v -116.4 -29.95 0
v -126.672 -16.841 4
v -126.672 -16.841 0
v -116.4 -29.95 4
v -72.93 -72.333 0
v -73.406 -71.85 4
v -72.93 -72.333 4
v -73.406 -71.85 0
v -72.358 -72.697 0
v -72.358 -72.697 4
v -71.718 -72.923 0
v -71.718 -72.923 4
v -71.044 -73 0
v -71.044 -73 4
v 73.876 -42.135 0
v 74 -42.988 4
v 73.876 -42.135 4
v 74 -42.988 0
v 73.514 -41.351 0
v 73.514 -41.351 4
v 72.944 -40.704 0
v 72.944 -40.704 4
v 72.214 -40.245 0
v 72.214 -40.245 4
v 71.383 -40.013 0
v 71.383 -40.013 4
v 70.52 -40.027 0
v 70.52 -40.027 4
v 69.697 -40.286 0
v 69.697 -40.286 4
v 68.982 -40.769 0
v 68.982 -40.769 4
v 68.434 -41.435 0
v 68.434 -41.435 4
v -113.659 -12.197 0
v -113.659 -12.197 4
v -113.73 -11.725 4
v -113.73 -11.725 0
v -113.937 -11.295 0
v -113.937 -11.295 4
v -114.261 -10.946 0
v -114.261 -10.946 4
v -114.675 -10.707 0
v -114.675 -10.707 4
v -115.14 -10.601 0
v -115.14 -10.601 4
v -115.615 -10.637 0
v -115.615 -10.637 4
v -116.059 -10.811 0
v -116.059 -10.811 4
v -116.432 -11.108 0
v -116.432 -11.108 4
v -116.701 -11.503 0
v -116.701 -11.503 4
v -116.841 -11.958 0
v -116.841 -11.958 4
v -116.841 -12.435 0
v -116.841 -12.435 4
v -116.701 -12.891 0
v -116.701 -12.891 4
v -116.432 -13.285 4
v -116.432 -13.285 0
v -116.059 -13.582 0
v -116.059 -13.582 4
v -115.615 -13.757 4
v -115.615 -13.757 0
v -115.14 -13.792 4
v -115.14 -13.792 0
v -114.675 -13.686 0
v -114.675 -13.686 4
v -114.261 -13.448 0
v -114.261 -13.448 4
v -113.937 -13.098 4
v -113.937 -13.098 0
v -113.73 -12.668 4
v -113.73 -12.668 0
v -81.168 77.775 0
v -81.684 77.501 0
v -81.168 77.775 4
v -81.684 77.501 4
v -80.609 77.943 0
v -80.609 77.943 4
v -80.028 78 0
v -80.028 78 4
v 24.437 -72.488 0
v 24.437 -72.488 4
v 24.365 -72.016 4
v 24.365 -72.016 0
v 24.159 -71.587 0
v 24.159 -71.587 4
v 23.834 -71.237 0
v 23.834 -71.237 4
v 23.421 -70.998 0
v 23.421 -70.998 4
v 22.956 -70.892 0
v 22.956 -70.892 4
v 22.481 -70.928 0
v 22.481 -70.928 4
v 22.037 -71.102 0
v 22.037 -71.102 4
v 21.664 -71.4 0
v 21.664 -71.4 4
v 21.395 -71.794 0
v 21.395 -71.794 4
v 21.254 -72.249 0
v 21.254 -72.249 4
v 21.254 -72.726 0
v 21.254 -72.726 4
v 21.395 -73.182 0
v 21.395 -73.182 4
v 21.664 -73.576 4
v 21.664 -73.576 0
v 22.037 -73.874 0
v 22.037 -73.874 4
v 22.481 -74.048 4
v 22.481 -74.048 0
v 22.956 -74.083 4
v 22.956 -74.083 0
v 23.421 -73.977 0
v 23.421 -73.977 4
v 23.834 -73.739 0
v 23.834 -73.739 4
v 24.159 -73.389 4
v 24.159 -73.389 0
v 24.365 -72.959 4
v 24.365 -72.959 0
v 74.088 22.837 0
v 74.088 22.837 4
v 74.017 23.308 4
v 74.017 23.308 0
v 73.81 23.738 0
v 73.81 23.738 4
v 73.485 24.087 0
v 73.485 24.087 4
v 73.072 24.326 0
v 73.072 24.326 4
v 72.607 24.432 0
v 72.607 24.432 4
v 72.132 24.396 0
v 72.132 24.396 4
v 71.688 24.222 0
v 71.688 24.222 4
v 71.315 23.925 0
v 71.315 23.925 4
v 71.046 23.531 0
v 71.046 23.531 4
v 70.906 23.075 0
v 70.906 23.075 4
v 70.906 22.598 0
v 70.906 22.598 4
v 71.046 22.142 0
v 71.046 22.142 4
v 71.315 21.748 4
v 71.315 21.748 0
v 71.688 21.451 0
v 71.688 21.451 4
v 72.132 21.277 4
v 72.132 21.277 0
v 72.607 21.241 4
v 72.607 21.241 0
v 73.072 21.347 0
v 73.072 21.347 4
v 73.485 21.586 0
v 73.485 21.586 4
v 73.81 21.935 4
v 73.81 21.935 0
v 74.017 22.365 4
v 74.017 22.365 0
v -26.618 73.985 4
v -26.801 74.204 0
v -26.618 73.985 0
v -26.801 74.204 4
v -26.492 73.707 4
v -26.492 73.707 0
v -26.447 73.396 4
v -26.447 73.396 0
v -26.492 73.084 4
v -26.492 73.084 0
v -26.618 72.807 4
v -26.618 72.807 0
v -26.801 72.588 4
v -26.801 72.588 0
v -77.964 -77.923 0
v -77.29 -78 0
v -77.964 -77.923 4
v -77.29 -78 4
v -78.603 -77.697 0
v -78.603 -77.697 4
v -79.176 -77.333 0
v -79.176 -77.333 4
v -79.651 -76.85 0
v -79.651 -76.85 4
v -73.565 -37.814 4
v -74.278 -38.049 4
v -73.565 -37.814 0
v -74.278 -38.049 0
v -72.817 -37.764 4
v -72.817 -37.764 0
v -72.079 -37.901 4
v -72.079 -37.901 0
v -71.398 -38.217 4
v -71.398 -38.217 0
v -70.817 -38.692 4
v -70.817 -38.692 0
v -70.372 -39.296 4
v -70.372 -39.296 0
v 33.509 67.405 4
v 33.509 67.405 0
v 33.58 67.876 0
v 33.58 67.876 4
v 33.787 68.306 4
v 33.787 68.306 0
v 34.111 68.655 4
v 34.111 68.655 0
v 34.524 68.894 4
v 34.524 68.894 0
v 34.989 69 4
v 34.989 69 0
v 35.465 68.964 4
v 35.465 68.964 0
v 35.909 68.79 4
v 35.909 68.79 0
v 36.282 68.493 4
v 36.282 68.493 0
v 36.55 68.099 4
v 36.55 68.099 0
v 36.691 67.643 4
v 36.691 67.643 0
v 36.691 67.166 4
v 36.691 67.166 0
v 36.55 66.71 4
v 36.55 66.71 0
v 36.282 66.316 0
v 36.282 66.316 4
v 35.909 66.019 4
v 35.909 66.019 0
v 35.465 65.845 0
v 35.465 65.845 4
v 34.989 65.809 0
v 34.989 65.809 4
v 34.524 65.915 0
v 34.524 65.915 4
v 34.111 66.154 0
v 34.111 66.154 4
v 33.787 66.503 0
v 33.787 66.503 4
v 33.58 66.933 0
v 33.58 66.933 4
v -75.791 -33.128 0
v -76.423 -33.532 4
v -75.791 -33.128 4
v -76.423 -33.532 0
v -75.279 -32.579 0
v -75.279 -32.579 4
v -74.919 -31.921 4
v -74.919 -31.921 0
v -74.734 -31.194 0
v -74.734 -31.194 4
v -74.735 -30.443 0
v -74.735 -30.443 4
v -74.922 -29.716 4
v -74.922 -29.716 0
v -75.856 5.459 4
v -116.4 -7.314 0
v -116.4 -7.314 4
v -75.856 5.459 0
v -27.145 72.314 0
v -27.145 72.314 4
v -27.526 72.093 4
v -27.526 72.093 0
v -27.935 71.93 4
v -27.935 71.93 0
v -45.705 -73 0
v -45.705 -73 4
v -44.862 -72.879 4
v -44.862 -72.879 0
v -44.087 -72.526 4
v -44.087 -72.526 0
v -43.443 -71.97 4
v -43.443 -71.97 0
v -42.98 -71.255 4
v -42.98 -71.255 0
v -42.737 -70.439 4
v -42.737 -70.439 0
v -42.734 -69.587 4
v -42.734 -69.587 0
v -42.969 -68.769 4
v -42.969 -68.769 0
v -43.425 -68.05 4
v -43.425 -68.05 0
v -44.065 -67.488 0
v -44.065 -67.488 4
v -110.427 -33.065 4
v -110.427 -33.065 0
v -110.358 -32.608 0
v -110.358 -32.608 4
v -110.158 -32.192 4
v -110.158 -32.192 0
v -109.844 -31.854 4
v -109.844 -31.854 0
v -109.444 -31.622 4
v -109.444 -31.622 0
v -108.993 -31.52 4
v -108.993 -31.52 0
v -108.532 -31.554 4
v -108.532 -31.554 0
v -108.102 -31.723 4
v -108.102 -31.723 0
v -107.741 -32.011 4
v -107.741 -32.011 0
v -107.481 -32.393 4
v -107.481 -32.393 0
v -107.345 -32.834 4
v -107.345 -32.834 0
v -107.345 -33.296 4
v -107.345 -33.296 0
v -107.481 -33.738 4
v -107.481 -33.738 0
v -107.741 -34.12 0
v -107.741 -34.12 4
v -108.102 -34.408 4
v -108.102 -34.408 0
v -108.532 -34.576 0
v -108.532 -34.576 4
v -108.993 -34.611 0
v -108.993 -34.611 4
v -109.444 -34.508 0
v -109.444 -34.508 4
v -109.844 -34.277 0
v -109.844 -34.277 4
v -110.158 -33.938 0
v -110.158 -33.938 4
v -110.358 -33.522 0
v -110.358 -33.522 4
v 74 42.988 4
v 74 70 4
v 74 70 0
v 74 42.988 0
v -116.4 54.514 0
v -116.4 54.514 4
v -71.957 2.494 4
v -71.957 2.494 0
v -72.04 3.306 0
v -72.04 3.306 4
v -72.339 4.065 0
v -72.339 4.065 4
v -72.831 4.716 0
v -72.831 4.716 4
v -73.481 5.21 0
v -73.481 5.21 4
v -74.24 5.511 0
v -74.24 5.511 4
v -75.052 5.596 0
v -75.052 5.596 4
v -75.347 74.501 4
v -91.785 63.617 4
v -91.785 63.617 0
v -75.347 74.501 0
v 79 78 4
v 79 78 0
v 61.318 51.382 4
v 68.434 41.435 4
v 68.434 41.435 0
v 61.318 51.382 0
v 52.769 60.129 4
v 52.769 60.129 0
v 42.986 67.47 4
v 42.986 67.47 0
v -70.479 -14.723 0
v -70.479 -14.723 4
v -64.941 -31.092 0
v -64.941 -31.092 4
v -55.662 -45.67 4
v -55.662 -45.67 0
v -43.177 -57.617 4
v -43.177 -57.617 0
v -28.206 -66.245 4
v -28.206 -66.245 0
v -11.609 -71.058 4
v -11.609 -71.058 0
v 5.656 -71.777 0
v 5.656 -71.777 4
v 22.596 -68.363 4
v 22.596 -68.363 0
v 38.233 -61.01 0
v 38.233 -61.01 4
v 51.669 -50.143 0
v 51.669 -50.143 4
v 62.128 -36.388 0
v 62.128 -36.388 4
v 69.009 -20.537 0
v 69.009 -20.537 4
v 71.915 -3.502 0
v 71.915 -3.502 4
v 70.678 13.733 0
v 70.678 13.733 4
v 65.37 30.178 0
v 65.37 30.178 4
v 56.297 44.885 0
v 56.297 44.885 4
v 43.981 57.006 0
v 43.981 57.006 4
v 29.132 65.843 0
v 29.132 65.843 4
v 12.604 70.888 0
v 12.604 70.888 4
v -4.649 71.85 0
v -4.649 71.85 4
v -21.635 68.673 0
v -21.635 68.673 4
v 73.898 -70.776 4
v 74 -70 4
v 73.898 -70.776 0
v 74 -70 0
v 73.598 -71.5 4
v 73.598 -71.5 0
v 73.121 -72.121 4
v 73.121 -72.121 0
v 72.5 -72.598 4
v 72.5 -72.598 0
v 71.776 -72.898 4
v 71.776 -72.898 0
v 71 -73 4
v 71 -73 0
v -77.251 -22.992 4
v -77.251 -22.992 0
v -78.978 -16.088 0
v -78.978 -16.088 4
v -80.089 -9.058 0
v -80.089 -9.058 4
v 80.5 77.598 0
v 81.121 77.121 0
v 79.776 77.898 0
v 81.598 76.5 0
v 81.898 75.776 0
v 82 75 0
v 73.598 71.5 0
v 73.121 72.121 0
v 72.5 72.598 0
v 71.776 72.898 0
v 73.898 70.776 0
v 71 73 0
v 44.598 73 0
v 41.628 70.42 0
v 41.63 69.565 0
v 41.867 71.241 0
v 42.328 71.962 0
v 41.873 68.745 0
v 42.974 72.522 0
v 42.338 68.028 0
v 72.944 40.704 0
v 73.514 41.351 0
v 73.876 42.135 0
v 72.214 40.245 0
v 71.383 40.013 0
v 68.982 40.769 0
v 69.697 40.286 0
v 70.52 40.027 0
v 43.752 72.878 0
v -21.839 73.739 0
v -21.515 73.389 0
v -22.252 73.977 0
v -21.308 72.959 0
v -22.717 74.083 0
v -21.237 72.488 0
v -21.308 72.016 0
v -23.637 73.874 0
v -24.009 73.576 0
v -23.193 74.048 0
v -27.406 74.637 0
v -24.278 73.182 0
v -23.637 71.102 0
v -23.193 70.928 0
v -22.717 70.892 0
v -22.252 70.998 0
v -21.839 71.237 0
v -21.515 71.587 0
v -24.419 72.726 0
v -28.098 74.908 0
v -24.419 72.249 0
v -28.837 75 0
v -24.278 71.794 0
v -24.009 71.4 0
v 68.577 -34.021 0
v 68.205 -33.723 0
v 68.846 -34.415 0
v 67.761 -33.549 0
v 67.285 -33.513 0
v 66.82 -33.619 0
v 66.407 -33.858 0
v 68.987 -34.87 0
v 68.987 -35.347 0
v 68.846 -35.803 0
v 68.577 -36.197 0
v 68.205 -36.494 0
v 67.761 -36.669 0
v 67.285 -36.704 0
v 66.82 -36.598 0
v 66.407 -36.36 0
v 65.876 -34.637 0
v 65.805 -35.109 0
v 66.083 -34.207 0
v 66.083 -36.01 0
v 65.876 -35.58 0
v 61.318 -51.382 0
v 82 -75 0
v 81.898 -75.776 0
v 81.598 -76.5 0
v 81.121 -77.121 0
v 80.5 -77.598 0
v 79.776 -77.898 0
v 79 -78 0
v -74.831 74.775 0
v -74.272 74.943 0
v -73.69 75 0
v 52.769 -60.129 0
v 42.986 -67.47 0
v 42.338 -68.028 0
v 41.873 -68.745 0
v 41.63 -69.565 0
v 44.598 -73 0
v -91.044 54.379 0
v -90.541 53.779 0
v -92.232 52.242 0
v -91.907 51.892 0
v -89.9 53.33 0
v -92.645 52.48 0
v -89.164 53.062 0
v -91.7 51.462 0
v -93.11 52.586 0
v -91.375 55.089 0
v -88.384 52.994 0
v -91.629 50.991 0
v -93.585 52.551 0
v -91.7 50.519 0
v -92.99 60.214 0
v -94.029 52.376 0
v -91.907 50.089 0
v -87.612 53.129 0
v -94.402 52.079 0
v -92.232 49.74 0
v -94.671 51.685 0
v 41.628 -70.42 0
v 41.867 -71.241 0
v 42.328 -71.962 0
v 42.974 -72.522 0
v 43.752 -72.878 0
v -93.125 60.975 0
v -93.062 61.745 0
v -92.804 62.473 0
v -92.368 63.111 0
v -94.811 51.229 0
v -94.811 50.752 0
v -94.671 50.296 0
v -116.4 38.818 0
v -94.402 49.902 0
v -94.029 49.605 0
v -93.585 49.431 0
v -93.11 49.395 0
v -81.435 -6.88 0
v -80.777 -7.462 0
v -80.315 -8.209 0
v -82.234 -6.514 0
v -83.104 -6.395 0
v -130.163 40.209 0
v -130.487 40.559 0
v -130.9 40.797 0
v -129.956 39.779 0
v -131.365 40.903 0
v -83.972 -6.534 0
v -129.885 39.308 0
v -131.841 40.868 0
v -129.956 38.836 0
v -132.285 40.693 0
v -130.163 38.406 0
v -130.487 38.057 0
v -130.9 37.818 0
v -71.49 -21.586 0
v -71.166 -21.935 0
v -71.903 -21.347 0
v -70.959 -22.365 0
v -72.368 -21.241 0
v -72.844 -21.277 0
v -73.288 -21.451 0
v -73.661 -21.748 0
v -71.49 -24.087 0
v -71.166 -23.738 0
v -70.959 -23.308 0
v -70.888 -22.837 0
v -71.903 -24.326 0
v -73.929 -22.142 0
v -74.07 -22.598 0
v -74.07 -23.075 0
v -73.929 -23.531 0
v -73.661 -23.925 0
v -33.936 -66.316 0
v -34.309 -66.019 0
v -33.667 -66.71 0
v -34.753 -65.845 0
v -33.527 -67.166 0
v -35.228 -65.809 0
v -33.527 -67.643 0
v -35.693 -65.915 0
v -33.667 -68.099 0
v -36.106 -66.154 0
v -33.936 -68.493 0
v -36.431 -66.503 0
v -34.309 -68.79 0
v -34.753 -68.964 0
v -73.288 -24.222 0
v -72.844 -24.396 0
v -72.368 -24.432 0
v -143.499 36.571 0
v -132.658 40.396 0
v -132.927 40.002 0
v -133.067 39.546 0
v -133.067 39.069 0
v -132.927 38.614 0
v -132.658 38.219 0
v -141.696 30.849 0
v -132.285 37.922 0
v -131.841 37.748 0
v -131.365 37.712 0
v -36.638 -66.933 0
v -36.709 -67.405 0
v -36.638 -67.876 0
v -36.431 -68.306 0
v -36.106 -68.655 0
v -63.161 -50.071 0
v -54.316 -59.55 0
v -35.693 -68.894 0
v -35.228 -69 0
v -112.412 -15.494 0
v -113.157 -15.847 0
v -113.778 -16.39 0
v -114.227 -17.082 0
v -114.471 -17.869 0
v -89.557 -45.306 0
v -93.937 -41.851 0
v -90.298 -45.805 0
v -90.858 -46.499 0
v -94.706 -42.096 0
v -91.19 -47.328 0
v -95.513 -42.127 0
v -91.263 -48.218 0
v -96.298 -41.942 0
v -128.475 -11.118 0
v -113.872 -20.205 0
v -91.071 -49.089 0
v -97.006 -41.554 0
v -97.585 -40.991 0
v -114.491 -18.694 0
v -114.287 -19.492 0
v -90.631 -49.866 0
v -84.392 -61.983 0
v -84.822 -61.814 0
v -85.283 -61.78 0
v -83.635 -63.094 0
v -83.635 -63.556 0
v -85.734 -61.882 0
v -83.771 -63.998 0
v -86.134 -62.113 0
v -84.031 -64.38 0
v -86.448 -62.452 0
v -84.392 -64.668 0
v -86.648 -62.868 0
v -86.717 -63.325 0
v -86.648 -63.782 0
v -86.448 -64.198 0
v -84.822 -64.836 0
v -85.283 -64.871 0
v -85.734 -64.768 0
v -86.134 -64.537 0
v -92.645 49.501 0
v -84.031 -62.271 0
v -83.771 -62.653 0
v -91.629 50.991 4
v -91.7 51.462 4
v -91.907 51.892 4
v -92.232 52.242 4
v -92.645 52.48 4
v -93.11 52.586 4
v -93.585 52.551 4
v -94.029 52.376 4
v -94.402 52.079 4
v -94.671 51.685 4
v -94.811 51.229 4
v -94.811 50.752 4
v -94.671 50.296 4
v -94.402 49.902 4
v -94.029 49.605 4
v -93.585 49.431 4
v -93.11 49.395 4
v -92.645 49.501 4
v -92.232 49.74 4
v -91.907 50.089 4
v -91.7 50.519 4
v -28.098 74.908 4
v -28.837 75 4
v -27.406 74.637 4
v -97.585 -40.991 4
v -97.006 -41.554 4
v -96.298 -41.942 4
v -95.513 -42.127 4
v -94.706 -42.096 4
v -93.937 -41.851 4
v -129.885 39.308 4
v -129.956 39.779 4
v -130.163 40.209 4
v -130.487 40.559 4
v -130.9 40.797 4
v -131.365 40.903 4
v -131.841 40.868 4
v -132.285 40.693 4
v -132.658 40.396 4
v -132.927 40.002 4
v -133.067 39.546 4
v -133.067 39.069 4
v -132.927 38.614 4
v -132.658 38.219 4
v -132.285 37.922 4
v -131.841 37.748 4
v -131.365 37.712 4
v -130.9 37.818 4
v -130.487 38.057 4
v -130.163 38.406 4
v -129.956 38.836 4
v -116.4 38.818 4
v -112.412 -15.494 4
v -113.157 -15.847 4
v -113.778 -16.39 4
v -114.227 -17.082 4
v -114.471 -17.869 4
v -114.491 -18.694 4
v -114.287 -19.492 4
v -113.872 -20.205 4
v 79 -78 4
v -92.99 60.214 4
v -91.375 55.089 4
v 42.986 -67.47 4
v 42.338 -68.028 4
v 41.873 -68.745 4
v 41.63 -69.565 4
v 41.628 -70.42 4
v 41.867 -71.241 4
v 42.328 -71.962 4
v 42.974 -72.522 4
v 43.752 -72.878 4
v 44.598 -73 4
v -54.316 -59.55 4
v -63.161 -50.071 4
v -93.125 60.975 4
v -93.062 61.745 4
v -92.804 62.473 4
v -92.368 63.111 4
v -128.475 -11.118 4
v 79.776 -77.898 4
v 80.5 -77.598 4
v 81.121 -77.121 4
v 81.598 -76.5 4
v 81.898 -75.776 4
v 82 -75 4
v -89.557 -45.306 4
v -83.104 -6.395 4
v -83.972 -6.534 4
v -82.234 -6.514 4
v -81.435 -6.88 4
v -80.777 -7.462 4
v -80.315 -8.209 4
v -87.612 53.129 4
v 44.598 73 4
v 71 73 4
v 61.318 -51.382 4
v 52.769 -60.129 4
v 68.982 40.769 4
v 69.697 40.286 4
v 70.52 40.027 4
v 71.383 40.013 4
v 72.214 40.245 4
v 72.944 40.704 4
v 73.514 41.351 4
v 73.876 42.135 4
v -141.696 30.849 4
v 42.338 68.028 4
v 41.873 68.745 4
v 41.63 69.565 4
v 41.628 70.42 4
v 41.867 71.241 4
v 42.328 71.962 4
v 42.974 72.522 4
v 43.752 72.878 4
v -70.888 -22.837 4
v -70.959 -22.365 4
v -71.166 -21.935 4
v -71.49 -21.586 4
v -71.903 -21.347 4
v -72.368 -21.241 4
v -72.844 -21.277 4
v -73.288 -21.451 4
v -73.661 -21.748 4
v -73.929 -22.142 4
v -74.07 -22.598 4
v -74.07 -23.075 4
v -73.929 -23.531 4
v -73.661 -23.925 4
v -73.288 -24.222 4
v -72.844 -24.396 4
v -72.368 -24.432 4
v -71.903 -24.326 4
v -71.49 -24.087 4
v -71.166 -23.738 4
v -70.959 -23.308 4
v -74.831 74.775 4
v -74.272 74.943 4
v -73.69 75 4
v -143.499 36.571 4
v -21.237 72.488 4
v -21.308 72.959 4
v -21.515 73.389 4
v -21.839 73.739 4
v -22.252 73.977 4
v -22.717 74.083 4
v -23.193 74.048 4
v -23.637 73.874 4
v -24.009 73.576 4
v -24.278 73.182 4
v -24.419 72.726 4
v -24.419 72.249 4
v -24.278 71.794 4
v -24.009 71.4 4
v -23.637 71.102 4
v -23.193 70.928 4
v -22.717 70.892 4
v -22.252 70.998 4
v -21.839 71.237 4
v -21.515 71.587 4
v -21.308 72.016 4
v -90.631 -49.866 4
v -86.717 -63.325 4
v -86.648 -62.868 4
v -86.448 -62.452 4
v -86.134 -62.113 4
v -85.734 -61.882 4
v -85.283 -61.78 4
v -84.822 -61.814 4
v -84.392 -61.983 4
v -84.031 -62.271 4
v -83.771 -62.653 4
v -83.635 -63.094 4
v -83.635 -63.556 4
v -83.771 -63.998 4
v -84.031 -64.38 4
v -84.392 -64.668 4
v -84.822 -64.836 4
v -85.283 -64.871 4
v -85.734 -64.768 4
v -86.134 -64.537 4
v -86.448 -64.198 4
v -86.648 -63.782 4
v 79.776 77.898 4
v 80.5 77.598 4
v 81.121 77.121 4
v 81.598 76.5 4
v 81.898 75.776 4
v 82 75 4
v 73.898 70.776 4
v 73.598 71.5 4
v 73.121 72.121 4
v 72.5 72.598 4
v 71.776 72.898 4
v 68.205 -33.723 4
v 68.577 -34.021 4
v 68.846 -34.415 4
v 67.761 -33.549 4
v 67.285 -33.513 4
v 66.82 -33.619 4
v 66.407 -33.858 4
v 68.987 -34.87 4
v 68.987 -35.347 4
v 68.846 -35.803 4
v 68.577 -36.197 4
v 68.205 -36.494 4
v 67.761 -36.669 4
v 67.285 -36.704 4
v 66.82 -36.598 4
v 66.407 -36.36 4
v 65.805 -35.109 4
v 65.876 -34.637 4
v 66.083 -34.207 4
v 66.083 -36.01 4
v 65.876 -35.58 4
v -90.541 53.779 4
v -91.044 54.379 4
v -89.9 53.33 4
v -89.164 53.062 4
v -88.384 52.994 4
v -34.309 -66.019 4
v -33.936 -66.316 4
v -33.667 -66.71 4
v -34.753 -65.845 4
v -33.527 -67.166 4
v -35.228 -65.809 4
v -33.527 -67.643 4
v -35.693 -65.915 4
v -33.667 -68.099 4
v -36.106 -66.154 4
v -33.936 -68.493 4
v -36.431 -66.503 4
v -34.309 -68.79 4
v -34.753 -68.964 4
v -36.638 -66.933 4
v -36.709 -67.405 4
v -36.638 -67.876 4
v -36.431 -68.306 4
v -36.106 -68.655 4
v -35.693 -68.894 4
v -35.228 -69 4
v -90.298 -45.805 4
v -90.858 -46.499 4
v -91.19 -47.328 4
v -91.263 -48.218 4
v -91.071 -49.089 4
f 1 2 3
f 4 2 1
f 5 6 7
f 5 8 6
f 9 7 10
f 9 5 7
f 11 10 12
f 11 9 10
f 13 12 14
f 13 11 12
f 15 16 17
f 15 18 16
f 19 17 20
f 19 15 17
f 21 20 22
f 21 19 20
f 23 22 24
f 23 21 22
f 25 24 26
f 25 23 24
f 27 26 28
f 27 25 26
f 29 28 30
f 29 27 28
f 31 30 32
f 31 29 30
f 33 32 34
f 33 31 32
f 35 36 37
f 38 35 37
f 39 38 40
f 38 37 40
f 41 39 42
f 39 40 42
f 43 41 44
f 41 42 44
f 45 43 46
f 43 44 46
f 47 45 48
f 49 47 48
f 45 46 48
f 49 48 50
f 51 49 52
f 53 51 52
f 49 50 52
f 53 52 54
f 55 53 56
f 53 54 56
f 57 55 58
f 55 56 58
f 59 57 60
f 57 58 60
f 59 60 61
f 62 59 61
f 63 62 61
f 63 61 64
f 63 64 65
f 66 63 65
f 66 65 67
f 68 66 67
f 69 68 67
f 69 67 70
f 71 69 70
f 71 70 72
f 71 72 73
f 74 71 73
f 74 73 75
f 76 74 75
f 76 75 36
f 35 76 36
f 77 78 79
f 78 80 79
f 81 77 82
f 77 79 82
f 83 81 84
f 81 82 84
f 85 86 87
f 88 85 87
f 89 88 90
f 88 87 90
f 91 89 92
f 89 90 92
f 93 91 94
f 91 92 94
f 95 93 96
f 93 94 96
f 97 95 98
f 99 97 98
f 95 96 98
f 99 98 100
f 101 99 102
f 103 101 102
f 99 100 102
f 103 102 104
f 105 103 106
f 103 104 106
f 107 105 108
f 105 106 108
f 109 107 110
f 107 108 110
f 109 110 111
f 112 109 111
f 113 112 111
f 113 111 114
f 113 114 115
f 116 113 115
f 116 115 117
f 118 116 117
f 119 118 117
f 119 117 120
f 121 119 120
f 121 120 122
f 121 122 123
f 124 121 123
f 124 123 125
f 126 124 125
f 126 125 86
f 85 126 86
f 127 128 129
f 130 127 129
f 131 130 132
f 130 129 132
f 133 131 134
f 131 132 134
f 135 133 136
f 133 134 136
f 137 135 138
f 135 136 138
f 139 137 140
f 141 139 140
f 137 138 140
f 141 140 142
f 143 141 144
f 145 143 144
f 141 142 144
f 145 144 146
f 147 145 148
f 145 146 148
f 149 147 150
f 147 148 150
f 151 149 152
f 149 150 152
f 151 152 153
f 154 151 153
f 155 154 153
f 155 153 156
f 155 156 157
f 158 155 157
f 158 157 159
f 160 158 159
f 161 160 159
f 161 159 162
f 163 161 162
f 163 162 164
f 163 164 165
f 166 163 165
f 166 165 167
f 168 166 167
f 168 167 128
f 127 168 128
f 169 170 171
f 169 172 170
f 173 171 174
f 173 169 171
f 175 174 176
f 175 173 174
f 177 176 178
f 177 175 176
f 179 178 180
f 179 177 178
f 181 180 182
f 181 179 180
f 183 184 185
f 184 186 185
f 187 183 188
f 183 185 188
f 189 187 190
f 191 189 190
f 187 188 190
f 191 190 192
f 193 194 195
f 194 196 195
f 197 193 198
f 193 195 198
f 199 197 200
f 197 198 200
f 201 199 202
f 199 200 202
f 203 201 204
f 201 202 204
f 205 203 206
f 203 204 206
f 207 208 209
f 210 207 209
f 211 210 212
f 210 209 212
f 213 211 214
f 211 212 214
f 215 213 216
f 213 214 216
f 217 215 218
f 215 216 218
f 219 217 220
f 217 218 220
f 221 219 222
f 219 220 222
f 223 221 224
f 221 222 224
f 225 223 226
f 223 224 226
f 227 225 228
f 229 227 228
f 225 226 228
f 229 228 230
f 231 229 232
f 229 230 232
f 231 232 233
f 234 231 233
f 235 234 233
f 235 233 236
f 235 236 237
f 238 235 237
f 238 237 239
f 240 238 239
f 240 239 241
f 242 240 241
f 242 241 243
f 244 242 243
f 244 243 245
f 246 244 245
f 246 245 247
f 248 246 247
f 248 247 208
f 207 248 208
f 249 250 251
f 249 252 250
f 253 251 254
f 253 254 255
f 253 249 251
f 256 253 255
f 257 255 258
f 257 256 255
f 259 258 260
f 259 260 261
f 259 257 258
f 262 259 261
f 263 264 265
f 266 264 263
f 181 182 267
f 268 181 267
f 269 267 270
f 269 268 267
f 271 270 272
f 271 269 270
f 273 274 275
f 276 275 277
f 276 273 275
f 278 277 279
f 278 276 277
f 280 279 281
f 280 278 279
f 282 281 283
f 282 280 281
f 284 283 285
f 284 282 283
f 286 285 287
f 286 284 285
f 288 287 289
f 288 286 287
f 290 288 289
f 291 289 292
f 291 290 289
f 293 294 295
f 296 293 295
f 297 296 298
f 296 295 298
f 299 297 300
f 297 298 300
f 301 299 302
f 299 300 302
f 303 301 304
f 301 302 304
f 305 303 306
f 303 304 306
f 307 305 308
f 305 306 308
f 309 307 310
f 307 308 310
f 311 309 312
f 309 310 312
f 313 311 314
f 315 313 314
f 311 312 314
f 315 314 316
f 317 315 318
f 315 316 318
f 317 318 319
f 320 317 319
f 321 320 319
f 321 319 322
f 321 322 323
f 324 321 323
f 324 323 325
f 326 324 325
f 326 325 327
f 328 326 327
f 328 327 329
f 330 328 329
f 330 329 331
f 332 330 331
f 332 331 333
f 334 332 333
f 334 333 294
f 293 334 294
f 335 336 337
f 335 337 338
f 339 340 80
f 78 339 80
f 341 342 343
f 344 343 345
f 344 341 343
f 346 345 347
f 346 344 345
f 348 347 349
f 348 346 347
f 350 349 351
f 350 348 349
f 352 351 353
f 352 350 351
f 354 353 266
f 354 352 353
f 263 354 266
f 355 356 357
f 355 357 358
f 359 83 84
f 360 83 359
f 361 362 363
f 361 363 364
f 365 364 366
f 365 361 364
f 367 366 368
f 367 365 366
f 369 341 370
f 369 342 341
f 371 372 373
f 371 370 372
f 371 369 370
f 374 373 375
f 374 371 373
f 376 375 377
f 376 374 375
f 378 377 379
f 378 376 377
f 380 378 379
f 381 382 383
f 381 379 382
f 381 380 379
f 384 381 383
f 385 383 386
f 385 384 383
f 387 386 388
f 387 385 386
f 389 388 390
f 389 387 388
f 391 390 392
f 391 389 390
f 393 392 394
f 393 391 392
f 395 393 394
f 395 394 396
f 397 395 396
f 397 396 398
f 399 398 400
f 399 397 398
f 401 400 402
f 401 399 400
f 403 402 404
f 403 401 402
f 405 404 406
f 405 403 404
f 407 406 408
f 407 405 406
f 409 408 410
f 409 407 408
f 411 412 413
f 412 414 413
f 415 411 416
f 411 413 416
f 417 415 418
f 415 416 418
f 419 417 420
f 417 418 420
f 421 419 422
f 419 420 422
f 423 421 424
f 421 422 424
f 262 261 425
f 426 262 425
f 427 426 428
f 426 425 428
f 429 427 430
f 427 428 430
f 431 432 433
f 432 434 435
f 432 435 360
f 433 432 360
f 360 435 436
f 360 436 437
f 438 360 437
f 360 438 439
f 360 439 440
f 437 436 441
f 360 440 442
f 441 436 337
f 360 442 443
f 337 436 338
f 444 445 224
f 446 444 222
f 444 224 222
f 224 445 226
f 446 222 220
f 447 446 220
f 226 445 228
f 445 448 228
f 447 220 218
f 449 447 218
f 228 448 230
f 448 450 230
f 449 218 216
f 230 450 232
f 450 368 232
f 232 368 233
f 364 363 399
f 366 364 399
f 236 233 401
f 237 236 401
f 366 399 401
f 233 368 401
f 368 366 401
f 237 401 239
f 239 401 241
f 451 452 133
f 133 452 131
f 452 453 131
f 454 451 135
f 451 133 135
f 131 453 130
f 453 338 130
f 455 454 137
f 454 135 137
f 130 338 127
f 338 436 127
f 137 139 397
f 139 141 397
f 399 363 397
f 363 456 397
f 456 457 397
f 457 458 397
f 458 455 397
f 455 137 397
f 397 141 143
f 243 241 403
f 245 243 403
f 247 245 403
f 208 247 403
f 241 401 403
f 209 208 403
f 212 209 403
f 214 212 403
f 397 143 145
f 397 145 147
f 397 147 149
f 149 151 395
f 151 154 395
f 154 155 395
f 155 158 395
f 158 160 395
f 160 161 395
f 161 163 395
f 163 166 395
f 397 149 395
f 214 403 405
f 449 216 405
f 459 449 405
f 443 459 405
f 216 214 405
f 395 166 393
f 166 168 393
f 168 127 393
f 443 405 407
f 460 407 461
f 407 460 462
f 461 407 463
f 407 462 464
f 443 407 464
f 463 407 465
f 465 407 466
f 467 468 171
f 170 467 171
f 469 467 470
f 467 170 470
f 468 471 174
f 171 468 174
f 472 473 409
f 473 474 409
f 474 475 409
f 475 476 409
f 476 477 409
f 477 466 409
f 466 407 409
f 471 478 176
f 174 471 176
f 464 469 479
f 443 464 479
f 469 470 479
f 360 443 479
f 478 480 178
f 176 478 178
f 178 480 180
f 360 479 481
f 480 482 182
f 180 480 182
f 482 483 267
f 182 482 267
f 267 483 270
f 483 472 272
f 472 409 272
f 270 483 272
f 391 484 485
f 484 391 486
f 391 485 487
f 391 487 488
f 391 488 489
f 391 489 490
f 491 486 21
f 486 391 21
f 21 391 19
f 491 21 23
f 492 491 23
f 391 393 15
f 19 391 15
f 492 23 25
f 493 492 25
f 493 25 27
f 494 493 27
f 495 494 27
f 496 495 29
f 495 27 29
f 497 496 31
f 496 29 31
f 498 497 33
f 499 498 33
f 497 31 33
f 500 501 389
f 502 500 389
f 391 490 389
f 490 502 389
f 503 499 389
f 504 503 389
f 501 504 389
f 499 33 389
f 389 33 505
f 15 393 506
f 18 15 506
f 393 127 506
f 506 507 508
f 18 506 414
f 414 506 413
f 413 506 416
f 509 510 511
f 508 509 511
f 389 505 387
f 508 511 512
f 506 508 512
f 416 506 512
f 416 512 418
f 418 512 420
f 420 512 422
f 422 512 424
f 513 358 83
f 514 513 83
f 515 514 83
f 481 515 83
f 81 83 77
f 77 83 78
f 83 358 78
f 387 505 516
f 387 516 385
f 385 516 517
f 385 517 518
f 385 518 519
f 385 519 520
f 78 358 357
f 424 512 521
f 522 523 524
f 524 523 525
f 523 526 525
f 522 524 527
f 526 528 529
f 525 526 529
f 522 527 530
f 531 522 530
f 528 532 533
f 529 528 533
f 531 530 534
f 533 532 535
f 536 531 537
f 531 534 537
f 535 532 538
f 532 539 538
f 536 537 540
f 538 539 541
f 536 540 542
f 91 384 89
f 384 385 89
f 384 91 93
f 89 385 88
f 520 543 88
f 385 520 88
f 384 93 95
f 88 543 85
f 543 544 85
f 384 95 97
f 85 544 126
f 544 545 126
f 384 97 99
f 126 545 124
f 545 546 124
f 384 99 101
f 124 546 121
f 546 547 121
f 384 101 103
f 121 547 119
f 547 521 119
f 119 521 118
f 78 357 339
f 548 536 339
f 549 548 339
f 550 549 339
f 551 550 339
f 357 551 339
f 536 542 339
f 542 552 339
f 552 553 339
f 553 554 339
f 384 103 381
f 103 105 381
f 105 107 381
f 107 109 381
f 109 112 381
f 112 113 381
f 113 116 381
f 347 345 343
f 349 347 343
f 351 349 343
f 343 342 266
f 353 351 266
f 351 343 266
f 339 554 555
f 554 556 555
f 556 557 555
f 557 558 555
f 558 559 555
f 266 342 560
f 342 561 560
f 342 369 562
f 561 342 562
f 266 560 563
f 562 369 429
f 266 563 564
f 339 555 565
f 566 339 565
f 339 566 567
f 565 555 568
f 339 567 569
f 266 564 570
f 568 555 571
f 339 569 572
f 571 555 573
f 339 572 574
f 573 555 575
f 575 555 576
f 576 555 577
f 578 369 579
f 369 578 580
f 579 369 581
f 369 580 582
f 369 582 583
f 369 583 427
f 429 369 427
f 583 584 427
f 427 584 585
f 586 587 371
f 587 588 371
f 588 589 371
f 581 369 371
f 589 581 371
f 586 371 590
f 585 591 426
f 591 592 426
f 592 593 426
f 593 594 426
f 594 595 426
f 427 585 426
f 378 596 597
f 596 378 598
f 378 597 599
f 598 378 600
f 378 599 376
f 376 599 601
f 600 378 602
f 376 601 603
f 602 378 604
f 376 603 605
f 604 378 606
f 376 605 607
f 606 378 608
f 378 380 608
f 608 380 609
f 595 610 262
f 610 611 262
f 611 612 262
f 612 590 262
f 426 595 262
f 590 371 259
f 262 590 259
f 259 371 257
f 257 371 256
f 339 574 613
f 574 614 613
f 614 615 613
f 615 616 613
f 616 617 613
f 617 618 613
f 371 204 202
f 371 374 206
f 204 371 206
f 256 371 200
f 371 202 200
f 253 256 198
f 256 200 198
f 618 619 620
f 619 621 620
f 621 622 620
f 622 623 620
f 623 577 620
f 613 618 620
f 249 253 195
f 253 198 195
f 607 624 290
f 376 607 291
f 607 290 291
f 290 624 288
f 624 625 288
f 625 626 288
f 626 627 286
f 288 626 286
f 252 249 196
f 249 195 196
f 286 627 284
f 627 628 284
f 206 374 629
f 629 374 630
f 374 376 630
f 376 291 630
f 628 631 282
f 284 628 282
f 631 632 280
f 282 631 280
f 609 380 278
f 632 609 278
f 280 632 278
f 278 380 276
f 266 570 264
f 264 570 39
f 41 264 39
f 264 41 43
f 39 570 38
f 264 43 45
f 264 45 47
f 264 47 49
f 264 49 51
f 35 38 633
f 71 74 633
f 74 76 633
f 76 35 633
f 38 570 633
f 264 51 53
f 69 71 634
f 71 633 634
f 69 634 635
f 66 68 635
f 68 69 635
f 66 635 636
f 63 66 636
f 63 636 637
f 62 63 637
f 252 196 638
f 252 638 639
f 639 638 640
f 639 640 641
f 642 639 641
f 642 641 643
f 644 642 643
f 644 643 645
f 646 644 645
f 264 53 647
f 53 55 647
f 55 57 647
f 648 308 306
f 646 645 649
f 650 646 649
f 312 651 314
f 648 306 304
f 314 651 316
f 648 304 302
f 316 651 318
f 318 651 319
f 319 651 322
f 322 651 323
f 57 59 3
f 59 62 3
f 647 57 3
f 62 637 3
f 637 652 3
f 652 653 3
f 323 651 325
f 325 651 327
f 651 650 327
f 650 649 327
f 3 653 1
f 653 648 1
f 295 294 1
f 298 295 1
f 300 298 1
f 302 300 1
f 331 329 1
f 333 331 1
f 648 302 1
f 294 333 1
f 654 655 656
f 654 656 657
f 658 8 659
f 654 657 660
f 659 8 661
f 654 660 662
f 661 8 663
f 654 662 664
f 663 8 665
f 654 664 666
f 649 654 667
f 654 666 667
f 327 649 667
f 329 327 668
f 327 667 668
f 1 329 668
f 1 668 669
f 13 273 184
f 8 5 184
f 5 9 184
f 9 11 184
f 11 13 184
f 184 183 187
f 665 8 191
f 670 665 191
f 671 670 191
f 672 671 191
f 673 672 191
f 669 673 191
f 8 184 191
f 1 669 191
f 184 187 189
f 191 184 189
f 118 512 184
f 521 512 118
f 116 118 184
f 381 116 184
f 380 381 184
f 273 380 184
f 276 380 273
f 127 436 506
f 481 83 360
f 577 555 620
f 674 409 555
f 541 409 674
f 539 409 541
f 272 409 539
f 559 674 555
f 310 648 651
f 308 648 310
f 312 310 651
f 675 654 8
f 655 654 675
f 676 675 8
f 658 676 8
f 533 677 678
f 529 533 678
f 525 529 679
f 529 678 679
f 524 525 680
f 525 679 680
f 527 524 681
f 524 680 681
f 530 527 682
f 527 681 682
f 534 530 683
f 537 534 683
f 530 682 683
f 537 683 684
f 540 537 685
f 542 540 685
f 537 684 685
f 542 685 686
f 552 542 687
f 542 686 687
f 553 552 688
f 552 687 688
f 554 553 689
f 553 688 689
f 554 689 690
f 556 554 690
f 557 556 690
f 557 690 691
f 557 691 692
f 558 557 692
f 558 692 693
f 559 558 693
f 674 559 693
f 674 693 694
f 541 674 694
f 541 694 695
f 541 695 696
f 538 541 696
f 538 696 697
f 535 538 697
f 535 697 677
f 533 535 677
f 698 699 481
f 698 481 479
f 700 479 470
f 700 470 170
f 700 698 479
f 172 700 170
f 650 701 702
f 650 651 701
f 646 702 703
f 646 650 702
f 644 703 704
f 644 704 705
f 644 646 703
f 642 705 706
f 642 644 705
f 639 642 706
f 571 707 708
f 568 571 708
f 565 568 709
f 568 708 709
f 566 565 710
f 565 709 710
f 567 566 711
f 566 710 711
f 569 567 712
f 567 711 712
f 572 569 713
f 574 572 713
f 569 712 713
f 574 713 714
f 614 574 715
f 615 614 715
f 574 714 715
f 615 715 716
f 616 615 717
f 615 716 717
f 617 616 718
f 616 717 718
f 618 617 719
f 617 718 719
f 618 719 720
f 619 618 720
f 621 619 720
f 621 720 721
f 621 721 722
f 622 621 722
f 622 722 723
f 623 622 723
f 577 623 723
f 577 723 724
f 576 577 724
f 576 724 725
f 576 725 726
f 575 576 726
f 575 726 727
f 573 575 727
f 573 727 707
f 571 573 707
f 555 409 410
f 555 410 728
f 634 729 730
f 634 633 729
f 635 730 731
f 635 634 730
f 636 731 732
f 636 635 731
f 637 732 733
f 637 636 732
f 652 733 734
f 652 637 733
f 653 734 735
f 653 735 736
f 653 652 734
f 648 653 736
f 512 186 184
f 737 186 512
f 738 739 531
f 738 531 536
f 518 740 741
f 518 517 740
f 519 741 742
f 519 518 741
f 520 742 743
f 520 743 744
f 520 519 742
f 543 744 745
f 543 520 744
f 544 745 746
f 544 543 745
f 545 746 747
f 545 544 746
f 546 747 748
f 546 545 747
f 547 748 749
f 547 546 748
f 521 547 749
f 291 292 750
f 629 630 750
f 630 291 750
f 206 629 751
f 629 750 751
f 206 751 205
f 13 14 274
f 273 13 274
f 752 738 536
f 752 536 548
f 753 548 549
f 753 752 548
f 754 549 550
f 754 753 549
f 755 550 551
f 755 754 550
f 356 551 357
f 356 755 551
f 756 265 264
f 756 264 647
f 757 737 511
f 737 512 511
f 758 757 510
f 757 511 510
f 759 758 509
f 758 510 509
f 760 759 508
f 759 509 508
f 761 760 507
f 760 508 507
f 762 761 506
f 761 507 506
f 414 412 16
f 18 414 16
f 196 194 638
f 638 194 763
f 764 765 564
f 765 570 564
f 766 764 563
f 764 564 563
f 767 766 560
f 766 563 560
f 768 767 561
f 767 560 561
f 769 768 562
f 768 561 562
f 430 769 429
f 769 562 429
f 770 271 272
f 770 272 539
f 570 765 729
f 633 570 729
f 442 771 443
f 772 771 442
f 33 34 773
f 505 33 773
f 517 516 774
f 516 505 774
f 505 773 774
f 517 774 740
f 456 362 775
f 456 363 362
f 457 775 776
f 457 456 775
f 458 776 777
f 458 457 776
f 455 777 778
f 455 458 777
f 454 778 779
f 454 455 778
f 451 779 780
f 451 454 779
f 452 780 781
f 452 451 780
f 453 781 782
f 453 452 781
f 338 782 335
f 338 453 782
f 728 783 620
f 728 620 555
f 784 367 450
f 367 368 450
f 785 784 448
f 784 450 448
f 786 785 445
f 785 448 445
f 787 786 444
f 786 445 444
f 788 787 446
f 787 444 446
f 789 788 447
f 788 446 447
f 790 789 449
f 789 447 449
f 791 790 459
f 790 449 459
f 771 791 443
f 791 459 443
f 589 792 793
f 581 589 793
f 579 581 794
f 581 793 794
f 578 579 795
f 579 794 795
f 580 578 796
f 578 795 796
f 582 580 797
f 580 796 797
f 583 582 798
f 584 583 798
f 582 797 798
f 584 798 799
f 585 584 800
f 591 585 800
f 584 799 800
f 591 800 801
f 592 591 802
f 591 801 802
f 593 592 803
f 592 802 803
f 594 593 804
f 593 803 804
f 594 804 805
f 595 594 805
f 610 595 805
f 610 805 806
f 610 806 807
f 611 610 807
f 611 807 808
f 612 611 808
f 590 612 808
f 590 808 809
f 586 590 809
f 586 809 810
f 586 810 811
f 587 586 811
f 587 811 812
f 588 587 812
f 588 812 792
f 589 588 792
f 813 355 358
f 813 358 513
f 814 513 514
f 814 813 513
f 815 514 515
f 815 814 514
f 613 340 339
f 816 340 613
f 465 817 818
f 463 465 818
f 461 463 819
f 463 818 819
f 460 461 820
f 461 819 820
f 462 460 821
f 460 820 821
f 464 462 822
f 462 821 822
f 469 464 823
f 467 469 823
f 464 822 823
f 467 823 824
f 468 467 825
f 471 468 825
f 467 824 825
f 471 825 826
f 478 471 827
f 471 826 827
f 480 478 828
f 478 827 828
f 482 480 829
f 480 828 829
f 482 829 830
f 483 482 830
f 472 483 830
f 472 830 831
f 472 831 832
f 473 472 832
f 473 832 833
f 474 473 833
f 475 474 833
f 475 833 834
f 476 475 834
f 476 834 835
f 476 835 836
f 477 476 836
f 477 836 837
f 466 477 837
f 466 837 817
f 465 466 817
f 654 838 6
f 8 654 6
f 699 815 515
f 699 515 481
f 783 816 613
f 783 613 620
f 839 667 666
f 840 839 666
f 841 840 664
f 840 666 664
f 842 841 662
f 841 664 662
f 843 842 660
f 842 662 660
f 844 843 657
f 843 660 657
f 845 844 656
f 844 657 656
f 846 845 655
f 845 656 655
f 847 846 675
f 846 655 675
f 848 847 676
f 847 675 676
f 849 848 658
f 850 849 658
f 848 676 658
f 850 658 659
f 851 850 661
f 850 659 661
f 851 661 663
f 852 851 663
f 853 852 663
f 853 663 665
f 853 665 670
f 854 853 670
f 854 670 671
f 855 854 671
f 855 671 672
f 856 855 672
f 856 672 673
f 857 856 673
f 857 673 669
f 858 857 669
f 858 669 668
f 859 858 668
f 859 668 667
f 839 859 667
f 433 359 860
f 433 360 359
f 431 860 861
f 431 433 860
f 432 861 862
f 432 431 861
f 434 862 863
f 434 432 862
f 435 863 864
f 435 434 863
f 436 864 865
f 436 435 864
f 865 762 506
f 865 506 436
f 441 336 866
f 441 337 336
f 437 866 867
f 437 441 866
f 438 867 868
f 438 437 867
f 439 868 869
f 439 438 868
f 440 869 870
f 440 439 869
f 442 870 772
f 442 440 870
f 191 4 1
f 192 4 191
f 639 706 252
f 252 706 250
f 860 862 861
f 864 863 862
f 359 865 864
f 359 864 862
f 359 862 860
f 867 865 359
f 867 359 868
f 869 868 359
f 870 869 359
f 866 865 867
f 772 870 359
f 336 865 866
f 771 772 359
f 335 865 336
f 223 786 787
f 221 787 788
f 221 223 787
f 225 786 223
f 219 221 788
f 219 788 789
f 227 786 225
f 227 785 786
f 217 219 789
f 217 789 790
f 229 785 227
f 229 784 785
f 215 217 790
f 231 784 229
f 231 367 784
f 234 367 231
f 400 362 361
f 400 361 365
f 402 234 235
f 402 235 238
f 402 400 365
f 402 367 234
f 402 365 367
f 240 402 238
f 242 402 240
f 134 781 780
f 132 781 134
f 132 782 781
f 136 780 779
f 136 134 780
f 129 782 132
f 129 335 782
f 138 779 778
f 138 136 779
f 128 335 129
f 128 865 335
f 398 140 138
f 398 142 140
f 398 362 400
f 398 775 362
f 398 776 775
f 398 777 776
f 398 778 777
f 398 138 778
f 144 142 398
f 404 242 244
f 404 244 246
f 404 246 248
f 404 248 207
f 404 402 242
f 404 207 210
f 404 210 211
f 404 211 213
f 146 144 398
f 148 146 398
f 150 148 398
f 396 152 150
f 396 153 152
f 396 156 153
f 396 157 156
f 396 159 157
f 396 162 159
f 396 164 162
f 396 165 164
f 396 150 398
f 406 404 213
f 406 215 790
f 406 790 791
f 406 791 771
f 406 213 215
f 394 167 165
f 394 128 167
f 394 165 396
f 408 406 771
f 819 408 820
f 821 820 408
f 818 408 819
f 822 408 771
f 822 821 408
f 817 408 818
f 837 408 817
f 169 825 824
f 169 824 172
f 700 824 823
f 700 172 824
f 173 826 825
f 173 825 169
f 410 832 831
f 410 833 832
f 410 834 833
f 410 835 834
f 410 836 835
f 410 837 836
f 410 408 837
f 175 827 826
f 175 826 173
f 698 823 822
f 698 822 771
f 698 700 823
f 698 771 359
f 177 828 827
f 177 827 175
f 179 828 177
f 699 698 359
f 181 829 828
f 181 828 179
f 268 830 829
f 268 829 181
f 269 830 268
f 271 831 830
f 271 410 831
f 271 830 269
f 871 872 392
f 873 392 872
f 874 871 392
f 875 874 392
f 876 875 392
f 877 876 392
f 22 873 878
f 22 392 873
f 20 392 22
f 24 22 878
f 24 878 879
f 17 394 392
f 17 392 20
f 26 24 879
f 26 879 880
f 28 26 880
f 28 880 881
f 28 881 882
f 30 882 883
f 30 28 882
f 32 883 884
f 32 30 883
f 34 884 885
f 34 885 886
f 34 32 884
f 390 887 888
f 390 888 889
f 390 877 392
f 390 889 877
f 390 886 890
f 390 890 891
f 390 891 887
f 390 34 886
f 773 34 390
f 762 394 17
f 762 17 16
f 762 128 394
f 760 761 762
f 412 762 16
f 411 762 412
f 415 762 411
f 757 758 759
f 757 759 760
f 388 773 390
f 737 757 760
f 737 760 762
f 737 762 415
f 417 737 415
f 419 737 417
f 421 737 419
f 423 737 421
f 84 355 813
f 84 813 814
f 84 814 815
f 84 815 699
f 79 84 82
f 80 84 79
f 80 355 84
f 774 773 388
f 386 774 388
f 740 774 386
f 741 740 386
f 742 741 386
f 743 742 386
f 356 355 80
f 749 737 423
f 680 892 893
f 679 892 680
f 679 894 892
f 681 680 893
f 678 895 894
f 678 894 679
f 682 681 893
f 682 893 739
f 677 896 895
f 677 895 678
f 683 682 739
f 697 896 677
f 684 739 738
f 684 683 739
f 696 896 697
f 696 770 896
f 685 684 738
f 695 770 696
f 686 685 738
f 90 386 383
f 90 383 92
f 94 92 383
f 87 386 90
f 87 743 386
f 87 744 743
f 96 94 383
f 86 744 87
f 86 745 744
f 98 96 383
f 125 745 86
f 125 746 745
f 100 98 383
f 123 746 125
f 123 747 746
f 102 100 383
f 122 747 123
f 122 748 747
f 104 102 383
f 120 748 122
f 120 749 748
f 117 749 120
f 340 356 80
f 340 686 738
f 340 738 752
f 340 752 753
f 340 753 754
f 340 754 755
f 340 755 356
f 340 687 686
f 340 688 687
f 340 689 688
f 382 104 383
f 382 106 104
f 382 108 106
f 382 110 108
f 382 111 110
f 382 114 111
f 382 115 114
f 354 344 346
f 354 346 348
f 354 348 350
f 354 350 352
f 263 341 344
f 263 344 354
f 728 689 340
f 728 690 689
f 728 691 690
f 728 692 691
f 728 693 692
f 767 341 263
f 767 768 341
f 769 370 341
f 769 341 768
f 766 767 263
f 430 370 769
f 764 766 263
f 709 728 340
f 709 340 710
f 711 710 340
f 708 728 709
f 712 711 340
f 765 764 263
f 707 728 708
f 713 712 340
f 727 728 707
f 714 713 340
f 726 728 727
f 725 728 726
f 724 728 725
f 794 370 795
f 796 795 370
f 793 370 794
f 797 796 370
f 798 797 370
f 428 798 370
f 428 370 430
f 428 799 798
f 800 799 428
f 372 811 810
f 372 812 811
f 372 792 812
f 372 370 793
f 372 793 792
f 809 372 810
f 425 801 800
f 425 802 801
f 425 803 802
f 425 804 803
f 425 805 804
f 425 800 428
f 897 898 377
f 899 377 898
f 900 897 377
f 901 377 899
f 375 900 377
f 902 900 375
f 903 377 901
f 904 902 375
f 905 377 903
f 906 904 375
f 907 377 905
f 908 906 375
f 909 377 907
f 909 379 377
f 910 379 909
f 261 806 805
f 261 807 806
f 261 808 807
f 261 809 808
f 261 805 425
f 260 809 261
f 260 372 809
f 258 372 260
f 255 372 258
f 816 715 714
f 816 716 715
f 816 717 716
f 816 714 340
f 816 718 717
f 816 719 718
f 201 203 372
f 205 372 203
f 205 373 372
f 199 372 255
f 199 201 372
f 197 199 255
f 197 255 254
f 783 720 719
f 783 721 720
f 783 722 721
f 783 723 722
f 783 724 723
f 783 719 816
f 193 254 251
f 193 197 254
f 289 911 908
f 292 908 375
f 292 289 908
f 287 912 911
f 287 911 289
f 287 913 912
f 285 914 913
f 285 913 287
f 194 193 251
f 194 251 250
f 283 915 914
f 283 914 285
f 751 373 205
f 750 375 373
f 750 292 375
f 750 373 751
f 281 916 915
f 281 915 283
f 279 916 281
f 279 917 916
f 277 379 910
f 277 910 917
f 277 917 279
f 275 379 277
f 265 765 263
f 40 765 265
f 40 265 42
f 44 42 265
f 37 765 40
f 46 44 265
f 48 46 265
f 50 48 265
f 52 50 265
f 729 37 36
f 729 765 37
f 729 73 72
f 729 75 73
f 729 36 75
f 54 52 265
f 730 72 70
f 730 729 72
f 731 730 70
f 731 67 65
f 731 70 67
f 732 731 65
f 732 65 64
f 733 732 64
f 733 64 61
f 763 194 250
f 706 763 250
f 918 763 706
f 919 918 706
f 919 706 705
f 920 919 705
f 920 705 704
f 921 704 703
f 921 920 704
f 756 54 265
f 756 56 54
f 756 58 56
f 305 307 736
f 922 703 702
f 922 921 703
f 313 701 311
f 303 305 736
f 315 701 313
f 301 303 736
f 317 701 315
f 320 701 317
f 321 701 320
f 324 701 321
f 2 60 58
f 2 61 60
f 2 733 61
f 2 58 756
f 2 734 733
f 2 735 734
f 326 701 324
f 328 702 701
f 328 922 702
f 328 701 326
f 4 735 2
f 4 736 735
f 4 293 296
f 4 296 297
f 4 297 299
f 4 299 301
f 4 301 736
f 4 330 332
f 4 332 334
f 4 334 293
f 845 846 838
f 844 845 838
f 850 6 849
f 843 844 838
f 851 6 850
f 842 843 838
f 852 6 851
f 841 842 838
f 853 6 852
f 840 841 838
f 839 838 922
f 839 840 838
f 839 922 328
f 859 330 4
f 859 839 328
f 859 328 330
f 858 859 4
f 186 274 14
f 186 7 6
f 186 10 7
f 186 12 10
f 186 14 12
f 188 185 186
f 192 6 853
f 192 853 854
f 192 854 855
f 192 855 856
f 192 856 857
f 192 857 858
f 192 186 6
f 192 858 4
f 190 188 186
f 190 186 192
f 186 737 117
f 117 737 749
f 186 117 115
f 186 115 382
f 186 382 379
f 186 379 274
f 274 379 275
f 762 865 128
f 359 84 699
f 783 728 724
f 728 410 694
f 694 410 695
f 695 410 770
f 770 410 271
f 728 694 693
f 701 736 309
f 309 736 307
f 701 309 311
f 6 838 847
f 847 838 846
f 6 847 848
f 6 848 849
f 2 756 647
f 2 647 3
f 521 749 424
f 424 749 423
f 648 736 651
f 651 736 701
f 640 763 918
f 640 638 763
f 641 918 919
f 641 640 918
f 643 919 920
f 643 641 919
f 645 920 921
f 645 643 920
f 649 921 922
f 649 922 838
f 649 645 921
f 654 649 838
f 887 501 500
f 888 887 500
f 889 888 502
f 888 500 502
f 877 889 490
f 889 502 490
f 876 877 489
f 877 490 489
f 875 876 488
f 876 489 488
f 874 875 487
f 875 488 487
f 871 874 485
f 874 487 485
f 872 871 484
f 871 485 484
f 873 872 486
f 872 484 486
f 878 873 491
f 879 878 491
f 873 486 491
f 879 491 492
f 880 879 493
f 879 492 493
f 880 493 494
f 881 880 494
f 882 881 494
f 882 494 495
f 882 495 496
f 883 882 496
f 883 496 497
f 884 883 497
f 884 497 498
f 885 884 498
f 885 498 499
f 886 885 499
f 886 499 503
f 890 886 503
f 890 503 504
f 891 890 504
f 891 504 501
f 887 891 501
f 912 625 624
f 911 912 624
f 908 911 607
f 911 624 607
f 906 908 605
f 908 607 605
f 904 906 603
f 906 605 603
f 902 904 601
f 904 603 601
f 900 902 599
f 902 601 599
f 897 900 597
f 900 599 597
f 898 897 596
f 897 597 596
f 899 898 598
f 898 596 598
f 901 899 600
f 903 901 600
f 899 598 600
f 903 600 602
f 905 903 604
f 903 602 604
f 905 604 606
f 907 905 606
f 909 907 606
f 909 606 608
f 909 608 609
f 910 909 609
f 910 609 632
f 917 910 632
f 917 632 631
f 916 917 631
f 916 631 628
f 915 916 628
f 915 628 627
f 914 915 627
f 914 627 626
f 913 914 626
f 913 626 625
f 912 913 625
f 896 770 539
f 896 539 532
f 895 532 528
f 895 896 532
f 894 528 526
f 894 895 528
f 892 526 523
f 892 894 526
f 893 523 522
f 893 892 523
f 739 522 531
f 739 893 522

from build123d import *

# Parameters (mm, degrees)
SKETCH_1_W           = 232.8
SKETCH_1_H           = 162
SKETCH_1_R           = 72
EXTRUDE_1_DEPTH      = 4
CUT_EXTRUDE_START    = -10
CUT_EXTRUDE_2_DEPTH  = 10
EXTRUDE_2_DEPTH      = 4
CUT_EXTRUDE_3_DEPTH  = 10
SKETCH_5_R           = 1.6
CUT_EXTRUDE_4_DEPTH  = 10
SKETCH_9_R           = 1.6
CUT_EXTRUDE_5_DEPTH  = 10
SKETCH_10_R          = 1.6
CUT_EXTRUDE_6_DEPTH  = 10
SKETCH_11_R          = 1.6
CUT_EXTRUDE_7_DEPTH  = 10
CUT_EXTRUDE_8_DEPTH  = 10
FILLET_1_R           = 3
FILLET_2_R           = 1.1
FILLET_3_R           = 3
CUT_EXTRUDE_9_DEPTH  = 10
FILLET_4_R           = 3
SKETCH_14_W          = 34.4
SKETCH_14_H          = 162
CUT_EXTRUDE_10_DEPTH = 10
CUT_EXTRUDE_11_DEPTH = 10
FILLET_5_R           = 3
SKETCH_16_R          = 1.55
CUT_EXTRUDE_12_DEPTH = 10
SKETCH_17_W          = 200
SKETCH_17_H          = 10
CUT_EXTRUDE_13_DEPTH = 5
FILLET_6_R           = 3


with BuildPart() as part:
    # 草图1 → 凸台-拉伸1 (new body)
    with BuildSketch(Plane.XY):
        Rectangle(SKETCH_1_W, SKETCH_1_H)
        Circle(SKETCH_1_R, mode=Mode.SUBTRACT)
    extrude(amount=EXTRUDE_1_DEPTH)

    # 草图3 → 切除-拉伸2 (cut)
    with BuildSketch(Plane.XY.offset(4).offset(CUT_EXTRUDE_START)):
        with BuildLine():
            Line((-21.634615385, 68.67272688), (-116.4, 38.817895988))
            Line((-116.4, 38.817895988), (-116.4, -7.313954951))
            Line((-116.4, -7.313954951), (-71.680591647, 6.774421088))
            ThreePointArc((-71.680591647, 6.774421088), (-55.989124219, 45.268288781), (-21.634615385, 68.67272688))
        make_face()
    extrude(amount=CUT_EXTRUDE_2_DEPTH, mode=Mode.SUBTRACT)

    # 草图6 → 凸台-拉伸2 (add)
    with BuildSketch(Plane.XY.offset(4)):
        Polygon((-126.671662246, -16.840640315), (-116.4, -29.949880057), (-116.4, -7.313954951), (-128.474546862, -11.117913075), align=None)
        Polygon((-116.4, 38.817895988), (-116.4, 54.514482194), (-143.498585323, 36.571480592), (-141.695700708, 30.848753352), align=None)
    extrude(amount=-EXTRUDE_2_DEPTH)

    # 草图7 → 切除-拉伸3 (cut)
    with BuildSketch(Plane.XY.offset(4)):
        Polygon((-116.4, -29.949880057), (-76.4, -81), (-116.4, -81), align=None)
        Polygon((-116.4, 54.514482194), (-76.4, 81), (-116.4, 81), align=None)
    extrude(amount=-CUT_EXTRUDE_3_DEPTH, mode=Mode.SUBTRACT)

    # 草图5 → 切除-拉伸4 (cut)
    with BuildSketch(Plane.XY.offset(4)):
        with Locations((-115.25907459, -12.196774271)):
            Circle(SKETCH_5_R)
        with Locations((-131.485036128, 39.307770889)):
            Circle(SKETCH_5_R)
    extrude(amount=-CUT_EXTRUDE_4_DEPTH, mode=Mode.SUBTRACT)

    # 草图9 → 切除-拉伸5 (cut)
    with BuildSketch(Plane.XY.offset(4)):
        with Locations((-22.836538462, 72.487878374)):
            Circle(SKETCH_9_R)
        with Locations((72.487878374, 22.836538462)):
            Circle(SKETCH_9_R)
        with Locations((22.836538462, -72.487878374)):
            Circle(SKETCH_9_R)
        with Locations((-72.487878374, -22.836538462)):
            Circle(SKETCH_9_R)
    extrude(amount=-CUT_EXTRUDE_5_DEPTH, mode=Mode.SUBTRACT)

    # 草图10 → 切除-拉伸6 (cut)
    with BuildSketch(Plane.XY.offset(4)):
        with Locations((-93.229198124, 50.99070111)):
            Circle(SKETCH_10_R)
    extrude(amount=-CUT_EXTRUDE_6_DEPTH, mode=Mode.SUBTRACT)

    # 草图11 → 切除-拉伸7 (cut)
    with BuildSketch(Plane(origin=(0, 0, 0), x_dir=(-1, 0, 0), z_dir=(0, 0, -1))):
        with Locations((-35.108799147, 67.404541557)):
            Circle(SKETCH_11_R)
        with Locations((-67.404541557, -35.108799147)):
            Circle(SKETCH_11_R)
        with Locations((35.108799147, -67.404541557)):
            Circle(SKETCH_11_R)
    extrude(amount=-CUT_EXTRUDE_7_DEPTH, mode=Mode.SUBTRACT)

    # 草图12 → 切除-拉伸8 (cut)
    with BuildSketch(Plane.XY.offset(4)):
        Polygon((-93.668674526, 62.369689763), (-74.593630829, 75), (-25.836538462, 75), (-25.836538462, 72.5912113), (-90.473635724, 52.227978291), align=None)
    extrude(amount=-CUT_EXTRUDE_8_DEPTH, mode=Mode.SUBTRACT)

    # 圆角1
    # the kernel refuses this fillet: 3 mm, written as the material it adds along each edge
    with BuildSketch(Plane(origin=(-25.836538462, 75, 4), x_dir=(0, -1, 0), z_dir=(0, 0, -1)), Plane(origin=(-90.473635724, 52.227978291, 4), x_dir=(-0.3004807692307691, 0.95378787333583, 0), z_dir=(0, 0, -1))) as fillet_1_piece_1:
        with BuildLine():
            CenterArc((FILLET_1_R, FILLET_1_R), FILLET_1_R, 180, 90)
            Line((0, FILLET_1_R), (0, 0))
            Line((0, 0), (FILLET_1_R, 0))
        make_face()
    extrude(amount=4)
    with BuildSketch(Plane(origin=(-25.836538462, 72.5912113, 4), x_dir=(-0.9537878733358296, -0.30048076923076983, 0), z_dir=(0, 0, -1))) as fillet_1_piece_2:
        with BuildLine():
            CenterArc((FILLET_1_R * 0.733411747334, FILLET_1_R), FILLET_1_R, 197.486481518, 72.513518482)
            Line((-FILLET_1_R * 0.220376126002, FILLET_1_R * 0.699519230769), (0, 0))
            Line((0, 0), (FILLET_1_R * 0.733411747334, 0))
        make_face()
    extrude(amount=4)
    with BuildSketch(Plane(origin=(-93.668674526, 62.369689763, 4), x_dir=(0.3004807692307694, -0.95378787333583, 0), z_dir=(0, 0, -1))) as fillet_1_piece_3:
        with BuildLine():
            CenterArc((FILLET_1_R * 0.753231578374, -FILLET_1_R), FILLET_1_R, 90, 73.976427328)
            Line((-FILLET_1_R * 0.207916633287, -FILLET_1_R * 0.72396718452), (0, 0))
            Line((0, 0), (FILLET_1_R * 0.753231578374, 0))
        make_face()
    extrude(amount=4)
    with BuildSketch(Plane(origin=(-74.593630829, 75, 4), x_dir=(1, 0, 0), z_dir=(0, 0, -1))) as fillet_1_piece_4:
        with BuildLine():
            CenterArc((FILLET_1_R * 0.30106152849, FILLET_1_R), FILLET_1_R, 236.48994581, 33.51005419)
            Line((-FILLET_1_R * 0.251021777541, FILLET_1_R * 0.166211043968), (0, 0))
            Line((0, 0), (FILLET_1_R * 0.30106152849, 0))
        make_face()
    extrude(amount=4)

    # 圆角2
    fillet_2_edges = [part.edges().sort_by_distance(p)[0] for p in [
        (-26.180986438, 73.395723271, 2),
    ]]
    fillet(fillet_2_edges, radius=FILLET_2_R)

    # 圆角3
    fillet_3_edges = [part.edges().sort_by_distance(p)[0] for p in [
        (-71.680591647, 6.774421088, 2),
        (-76.4, -81, 2),
        (-76.4, 81, 2),
    ]]
    fillet(fillet_3_edges, radius=FILLET_3_R)

    # 草图13 → 切除-拉伸9 (cut)
    with BuildSketch(Plane.XY.offset(4)):
        with BuildLine():
            Line((-71.696957036, -36.822633688), (-92.944059946, -46.914680662))
            Line((-92.944059946, -46.914680662), (-72.505072248, -73))
            Line((-72.505072248, -73), (-34.166650407, -73))
            ThreePointArc((-34.166650407, -73), (-55.937253271, -58.029162466), (-71.696957036, -36.822633688))
        make_face()
        with BuildLine():
            Line((-80.417945117, -5.414250016), (-116.543877682, -16.79534251))
            Line((-116.543877682, -16.79534251), (-96.104889984, -42.880661848))
            Line((-96.104889984, -42.880661848), (-73.842184412, -32.306219235))
            ThreePointArc((-73.842184412, -32.306219235), (-78.293303626, -19.144675692), (-80.417945117, -5.414250016))
        make_face()
    extrude(amount=-CUT_EXTRUDE_9_DEPTH, mode=Mode.SUBTRACT)

    # 圆角4
    fillet_4_edges = [part.edges().sort_by_distance(p)[0] for p in [
        (-80.417945117, -5.414250016, 2),
        (-73.842184412, -32.306219235, 2),
        (-96.104889984, -42.880661848, 2),
        (-116.543877682, -16.79534251, 2),
        (-71.696957036, -36.822633688, 2),
        (-34.166650407, -73, 2),
        (-72.505072248, -73, 2),
        (-92.944059946, -46.914680662, 2),
    ]]
    fillet(fillet_4_edges, radius=FILLET_4_R)

    # 草图14 → 切除-拉伸10 (cut)
    with BuildSketch(Plane.XY.offset(4)):
        with Locations((99.2, 0)):
            Rectangle(SKETCH_14_W, SKETCH_14_H)
    extrude(amount=-CUT_EXTRUDE_10_DEPTH, mode=Mode.SUBTRACT)

    # 草图15 → 切除-拉伸11 (cut)
    with BuildSketch(Plane.XY.offset(4)):
        with BuildLine():
            Line((32.726136344, 73), (74, 73))
            Line((74, 73), (74, 30.397368307))
            ThreePointArc((74, 30.397368307), (57.457489516, 55.665401269), (32.726136344, 73))
        make_face()
        with BuildLine():
            Line((74, -73), (74, -30.397368307))
            ThreePointArc((74, -30.397368307), (57.457489516, -55.665401269), (32.726136344, -73))
            Line((32.726136344, -73), (74, -73))
        make_face()
    extrude(amount=-CUT_EXTRUDE_11_DEPTH, mode=Mode.SUBTRACT)

    # 圆角5
    fillet_5_edges = [part.edges().sort_by_distance(p)[0] for p in [
        (82, 81, 2),
        (82, -81, 2),
        (74, 30.397368307, 2),
        (32.726136344, 73, 2),
        (74, 73, 2),
        (32.726136344, -73, 2),
        (74, -30.397368307, 2),
        (74, -73, 2),
    ]]
    fillet(fillet_5_edges, radius=FILLET_5_R)

    # 草图16 → 切除-拉伸12 (cut)
    with BuildSketch(Plane(origin=(0, 0, 0), x_dir=(-1, 0, 0), z_dir=(0, 0, -1))):
        with Locations((108.877259832, -33.065343142)):
            Circle(SKETCH_16_R)
        with Locations((85.167293187, -63.325259168)):
            Circle(SKETCH_16_R)
    extrude(amount=-CUT_EXTRUDE_12_DEPTH, mode=Mode.SUBTRACT)

    # 草图17 → 切除-拉伸13 (cut, symmetric)
    with BuildSketch(Plane.XY.offset(4)):
        with Locations((0, 83)):
            Rectangle(SKETCH_17_W, SKETCH_17_H)
        with Locations((0, -83)):
            Rectangle(SKETCH_17_W, SKETCH_17_H)
    extrude(amount=CUT_EXTRUDE_13_DEPTH, both=True, mode=Mode.SUBTRACT)

    # 圆角6
    fillet_6_edges = [part.edges().sort_by_distance(p)[0] for p in [
        (82, -78, 2),
        (82, 78, 2),
        (-80.930777947, 78, 2),
        (-78.750631108, -78, 2),
    ]]
    fillet(fillet_6_edges, radius=FILLET_6_R)


solid = part.part
